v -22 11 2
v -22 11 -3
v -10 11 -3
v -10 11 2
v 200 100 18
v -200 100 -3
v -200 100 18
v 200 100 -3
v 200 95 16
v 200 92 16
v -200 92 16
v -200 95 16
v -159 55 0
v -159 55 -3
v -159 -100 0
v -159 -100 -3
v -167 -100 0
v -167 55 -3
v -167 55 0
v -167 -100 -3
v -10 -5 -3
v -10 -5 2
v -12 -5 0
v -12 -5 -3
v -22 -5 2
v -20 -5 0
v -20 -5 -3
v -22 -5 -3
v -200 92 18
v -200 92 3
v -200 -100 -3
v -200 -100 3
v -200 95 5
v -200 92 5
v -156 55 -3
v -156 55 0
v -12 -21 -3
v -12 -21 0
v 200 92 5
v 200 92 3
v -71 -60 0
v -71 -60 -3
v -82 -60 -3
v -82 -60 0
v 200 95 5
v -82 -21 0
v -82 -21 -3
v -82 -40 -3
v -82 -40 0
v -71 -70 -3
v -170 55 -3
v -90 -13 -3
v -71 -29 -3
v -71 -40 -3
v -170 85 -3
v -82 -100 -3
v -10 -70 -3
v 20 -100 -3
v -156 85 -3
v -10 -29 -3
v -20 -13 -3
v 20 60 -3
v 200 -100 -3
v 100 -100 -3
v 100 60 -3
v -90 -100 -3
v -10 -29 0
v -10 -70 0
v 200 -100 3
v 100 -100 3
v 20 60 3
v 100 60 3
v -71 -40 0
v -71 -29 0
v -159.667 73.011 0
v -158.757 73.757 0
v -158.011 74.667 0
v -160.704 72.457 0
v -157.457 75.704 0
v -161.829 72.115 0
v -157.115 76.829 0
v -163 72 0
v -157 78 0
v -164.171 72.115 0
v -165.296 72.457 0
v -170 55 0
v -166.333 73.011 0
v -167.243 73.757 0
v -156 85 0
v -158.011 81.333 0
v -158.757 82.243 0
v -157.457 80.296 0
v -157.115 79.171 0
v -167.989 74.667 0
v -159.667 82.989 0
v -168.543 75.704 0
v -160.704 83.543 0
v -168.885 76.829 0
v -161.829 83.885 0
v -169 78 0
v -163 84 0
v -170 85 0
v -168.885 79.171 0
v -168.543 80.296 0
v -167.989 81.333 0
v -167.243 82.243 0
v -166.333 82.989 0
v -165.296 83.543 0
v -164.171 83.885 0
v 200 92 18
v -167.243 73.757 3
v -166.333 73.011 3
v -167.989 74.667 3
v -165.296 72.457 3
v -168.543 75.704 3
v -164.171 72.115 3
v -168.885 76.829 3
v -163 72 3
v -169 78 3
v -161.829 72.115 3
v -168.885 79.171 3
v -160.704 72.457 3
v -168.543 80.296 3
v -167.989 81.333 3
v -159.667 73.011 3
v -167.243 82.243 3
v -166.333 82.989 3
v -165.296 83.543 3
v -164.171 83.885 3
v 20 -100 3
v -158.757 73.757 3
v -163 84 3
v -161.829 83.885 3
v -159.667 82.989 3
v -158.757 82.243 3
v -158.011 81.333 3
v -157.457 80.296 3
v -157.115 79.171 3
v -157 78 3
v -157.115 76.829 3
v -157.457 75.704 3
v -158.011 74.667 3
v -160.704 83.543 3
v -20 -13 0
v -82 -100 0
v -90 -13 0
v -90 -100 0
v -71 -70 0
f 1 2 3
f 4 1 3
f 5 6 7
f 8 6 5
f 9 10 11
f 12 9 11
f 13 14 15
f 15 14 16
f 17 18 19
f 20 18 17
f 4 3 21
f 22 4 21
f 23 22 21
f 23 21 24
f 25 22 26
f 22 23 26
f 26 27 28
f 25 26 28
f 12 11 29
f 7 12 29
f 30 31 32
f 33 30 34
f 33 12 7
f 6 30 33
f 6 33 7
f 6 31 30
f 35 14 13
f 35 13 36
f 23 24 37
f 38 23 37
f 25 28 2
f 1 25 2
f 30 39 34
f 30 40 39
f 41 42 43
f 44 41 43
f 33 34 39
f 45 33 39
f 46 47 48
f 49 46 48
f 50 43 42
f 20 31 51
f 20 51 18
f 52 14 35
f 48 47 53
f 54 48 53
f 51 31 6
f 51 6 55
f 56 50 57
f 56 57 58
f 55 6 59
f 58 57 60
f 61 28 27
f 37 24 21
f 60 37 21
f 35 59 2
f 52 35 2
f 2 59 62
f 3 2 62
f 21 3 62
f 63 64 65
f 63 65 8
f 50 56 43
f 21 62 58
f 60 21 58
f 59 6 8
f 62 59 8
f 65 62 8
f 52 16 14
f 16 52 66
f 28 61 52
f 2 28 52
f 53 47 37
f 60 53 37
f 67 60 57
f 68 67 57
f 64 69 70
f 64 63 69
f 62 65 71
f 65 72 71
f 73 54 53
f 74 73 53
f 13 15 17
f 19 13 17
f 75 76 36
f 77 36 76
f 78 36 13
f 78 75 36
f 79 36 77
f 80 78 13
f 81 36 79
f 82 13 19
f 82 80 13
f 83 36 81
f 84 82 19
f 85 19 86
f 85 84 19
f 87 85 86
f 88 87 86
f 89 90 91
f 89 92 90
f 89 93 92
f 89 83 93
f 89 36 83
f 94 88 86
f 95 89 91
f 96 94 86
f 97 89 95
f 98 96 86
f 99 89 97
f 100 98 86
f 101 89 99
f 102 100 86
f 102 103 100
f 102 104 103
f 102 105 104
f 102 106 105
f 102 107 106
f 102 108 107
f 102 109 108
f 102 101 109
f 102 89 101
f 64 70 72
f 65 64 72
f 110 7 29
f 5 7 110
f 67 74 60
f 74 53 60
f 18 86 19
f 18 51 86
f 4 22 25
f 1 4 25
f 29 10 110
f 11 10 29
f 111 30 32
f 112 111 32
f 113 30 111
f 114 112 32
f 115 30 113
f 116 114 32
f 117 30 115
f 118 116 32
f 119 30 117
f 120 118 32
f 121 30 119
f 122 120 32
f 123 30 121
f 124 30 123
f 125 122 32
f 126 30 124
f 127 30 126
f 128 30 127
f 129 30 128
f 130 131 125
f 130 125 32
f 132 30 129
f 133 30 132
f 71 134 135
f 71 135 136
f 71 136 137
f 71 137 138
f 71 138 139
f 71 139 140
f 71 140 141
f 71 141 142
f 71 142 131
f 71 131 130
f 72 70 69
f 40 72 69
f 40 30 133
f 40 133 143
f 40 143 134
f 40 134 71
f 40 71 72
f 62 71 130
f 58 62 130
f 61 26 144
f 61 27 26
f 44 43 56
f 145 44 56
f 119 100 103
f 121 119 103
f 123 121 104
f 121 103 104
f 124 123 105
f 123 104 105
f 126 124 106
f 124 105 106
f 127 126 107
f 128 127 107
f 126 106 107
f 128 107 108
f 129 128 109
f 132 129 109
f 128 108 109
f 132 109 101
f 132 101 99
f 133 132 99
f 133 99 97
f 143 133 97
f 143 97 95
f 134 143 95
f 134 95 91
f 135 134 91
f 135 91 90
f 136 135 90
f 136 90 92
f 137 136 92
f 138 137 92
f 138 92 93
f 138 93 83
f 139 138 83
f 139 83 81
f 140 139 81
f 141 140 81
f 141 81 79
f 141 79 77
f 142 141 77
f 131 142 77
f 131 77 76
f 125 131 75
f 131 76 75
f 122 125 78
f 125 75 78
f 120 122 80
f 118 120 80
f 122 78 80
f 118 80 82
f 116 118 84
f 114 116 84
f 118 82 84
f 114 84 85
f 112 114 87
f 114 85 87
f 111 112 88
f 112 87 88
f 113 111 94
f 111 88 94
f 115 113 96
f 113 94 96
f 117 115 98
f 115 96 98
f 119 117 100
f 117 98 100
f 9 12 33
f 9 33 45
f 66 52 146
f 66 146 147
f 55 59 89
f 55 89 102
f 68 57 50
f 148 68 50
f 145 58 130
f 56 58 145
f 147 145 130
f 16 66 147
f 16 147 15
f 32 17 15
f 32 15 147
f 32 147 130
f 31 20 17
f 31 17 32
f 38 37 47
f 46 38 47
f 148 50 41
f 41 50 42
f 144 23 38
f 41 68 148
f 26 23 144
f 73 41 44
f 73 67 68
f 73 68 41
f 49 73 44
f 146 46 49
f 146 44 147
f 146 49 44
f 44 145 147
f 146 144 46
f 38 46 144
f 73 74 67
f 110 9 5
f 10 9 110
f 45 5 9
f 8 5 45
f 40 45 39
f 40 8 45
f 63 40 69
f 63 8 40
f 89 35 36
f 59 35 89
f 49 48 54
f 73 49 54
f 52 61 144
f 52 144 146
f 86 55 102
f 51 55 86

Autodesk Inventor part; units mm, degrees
ref_plane "YZ Plane" through (0, 0, 0) normal (1, 0, 0) x (0, 1, 0)
ref_plane "XZ Plane" through (0, 0, 0) normal (0, 1, 0) x (-1, 0, 0)
ref_plane "XY Plane" through (0, 0, 0) normal (0, 0, 1) x (1, 0, 0)
sketch "Szkic1" plane through (0, 0, 0) normal (0, 0, 1) x (1, 0, 0)
  line L0 (200, -100) -> (-200, -100)
  line L1 (-200, -100) -> (-200, 100)
  line L2 (-200, 100) -> (200, 100)
  line L3 (200, 100) -> (200, -100)
  line L4 (200, -100) -> (-200, 100) construction
  line L5 (-200, -100) -> (200, 100) construction
  point P0 (0, 0)
  dimension "d0" = 400
  dimension "d1" = 200
extrude "Wyciągnięcie proste1" add sketch "Szkic1" along normal mid plane 6
sketch "Szkic2" plane through (0, 0, 3) normal (0, 0, 1) x (1, 0, 0)
  line L0 (-200, -100) -> (200, -100) projected
  line L1 (20, -100) -> (100, -100)
  line L2 (100, -100) -> (100, 60)
  line L3 (100, 60) -> (20, 60)
  line L4 (20, 60) -> (20, -100)
  line L5 (200, -100) -> (200, 100) projected
  line L6 (-22, 11) -> (-10, 11)
  line L7 (-10, 11) -> (-10, -5)
  line L8 (-10, -5) -> (-22, -5)
  line L9 (-22, -5) -> (-22, 11)
  line L10 (-71, -29) -> (-10, -29)
  line L11 (-10, -29) -> (-10, -70)
  line L12 (-10, -70) -> (-71, -70)
  line L13 (-71, -70) -> (-71, -29)
  point P0 (0, 0)
  point P1 (-10, 3)
  dimension "d4" = 80
  dimension "d5" = 160
  dimension "d6" = 100
  dimension "d7" = 16
  dimension "d8" = 12
  dimension "d9" = 95
  dimension "d10" = 61
  dimension "d11" = 41
  dimension "d12" = 30
  dimension "d13" = 30
  dimension "d14" = 30
extrude "Wyciągnięcie proste2" cut sketch "Szkic2" against normal through all contours L4 L3 L2 L0
sketch "Szkic3" plane through (0, 0, -3) normal (0, 0, -1) x (-1, 0, 0)
  line L0 (71, -29) -> (10, -29) projected
  line L1 (71, -70) -> (71, -29) projected
  line L2 (10, -70) -> (71, -70) projected
  line L3 (10, -29) -> (10, -70) projected
  line L4 (10, -5) -> (22, -5) projected
  line L5 (22, -5) -> (22, 11) projected
  line L6 (22, 11) -> (10, 11) projected
  line L7 (10, 11) -> (10, -5) projected
  point P0 (0, 0)
  point P1 (10, 3)
extrude "Wyciągnięcie proste3" cut sketch "Szkic3" against normal blind 5 contours L7 L6 L5 L4
sketch "Szkic4" plane through (0, 0, -3) normal (0, 0, -1) x (-1, 0, 0)
  line L0 (71, -29) -> (10, -29) projected
  line L1 (71, -70) -> (71, -29) projected
  line L2 (10, -70) -> (71, -70) projected
  line L3 (10, -29) -> (10, -70) projected
  point P0 (0, 0)
extrude "Wyciągnięcie proste4" cut sketch "Szkic4" against normal blind 3
sketch "Szkic6" plane through (0, 0, -3) normal (0, 0, -1) x (-1, 0, 0)
  line L0 (22, -5) -> (10, -5) projected
  line L1 (12, -5) -> (12, -21)
  line L2 (12, -21) -> (82, -21)
  line L3 (82, -21) -> (82, -40)
  line L4 (82, -40) -> (71, -40)
  line L5 (71, -29) -> (71, -70) projected
  line L6 (71, -60) -> (82, -60)
  line L7 (71, -70) -> (10, -70) projected
  line L8 (10, -70) -> (10, -29) projected
  line L9 (10, -29) -> (71, -29) projected
  line L10 (71, -29) -> (71, -70) projected
  line L11 (10, 11) -> (22, 11) projected
  line L12 (22, 11) -> (22, -5) projected
  line L13 (22, -5) -> (10, -5) projected
  line L14 (10, -5) -> (10, 11) projected
  line L15 (-20, 60) -> (-20, -100) projected
  line L16 (-20, -100) -> (200, -100) projected
  line L17 (200, -100) -> (200, 100) projected
  line L18 (200, 100) -> (-200, 100) projected
  line L19 (-200, 100) -> (-200, -100) projected
  line L20 (-200, -100) -> (-100, -100) projected
  line L21 (-100, -100) -> (-100, 60) projected
  line L22 (-100, 60) -> (-20, 60) projected
  line L23 (82, -60) -> (82, -100)
  line L24 (-20, -100) -> (200, -100) projected
  line L25 (20, -5) -> (20, -13)
  line L26 (20, -13) -> (90, -13)
  line L27 (90, -13) -> (90, -100)
  point P0 (0, 0)
  point P1 (12, -13)
  dimension "d21" = 8
  dimension "d22" = 32
  dimension "d23" = 8
  dimension "d24" = 8
  dimension "d25" = 20
  dimension "d26" = 40
  dimension "d27" = 8
  dimension "d28" = 8
extrude "Wyciągnięcie proste5" cut sketch "Szkic6" against normal blind 3 contours L25 L26 L27 L16 L23 L6 L5 L4 L3 L2 L1 L0
sketch "Szkic7" plane through (0, 0, 3) normal (0, 0, 1) x (1, 0, 0)
  line L0 (-200, 100) -> (200, 100) projected
  line L1 (200, 100) -> (200, -100) projected
  line L2 (-200, 100) -> (200, 100)
  line L3 (200, 100) -> (200, 92)
  line L4 (200, 92) -> (-200, 92)
  line L5 (-200, 92) -> (-200, 100)
  point P0 (0, 0)
  dimension "d31" = 8
extrude "Wyciągnięcie proste6" add sketch "Szkic7" along normal blind 15
sketch "Szkic8" plane through (-200, 92, 3) normal (0, -1, 0) x (1, 0, 0)
  line L0 (400, 15) -> (400, -6) projected
  line L1 (0, -6) -> (0, 15) projected
  line L2 (400, 13) -> (0, 13)
  line L3 (0, 13) -> (0, 2)
  line L4 (0, 2) -> (400, 2)
  line L5 (400, 2) -> (400, 13)
  line L6 (0, 15) -> (400, 15) projected
  point P0 (200, -3)
  point P1 (0, 13)
  dimension "d34" = 11
  dimension "d35" = 2
extrude "Wyciągnięcie proste7" cut sketch "Szkic8" against normal blind 3 contours L0 L4 L1 L2
sketch "Szkic9" plane through (0, 0, -3) normal (0, 0, -1) x (-1, 0, 0)
  line L0 (156, 85) -> (170, 85)
  line L1 (170, 85) -> (170, 55)
  line L2 (170, 55) -> (156, 55)
  line L3 (156, 55) -> (156, 85)
  line L4 (200, -100) -> (200, 100) projected
  line L5 (200, 100) -> (-200, 100) projected
  circle A0 centre (163, 78) radius 6
  line L6 (90, -100) -> (200, -100) projected
  line L7 (159, 55) -> (159, -100)
  line L8 (167, 55) -> (167, -100)
  point P0 (0, 0)
  point P1 (163, 55)
  dimension "d38" = 14
  dimension "d39" = 30
  dimension "d40" = 30
  dimension "d41" = 15
  dimension "d42" = 12
  dimension "d43" = 23
  dimension "d44" = 7
  dimension "d49" = 8
  dimension "d50" = 33
extrude "Wyciągnięcie proste8" cut sketch "Szkic9" against normal blind 6 contours A0
extrude "Wyciągnięcie proste9" cut sketch "Szkic9" against normal blind 3 contours L0 L1 L2 L3
extrude "Wyciągnięcie proste10" cut sketch "Szkic9" against normal blind 3 contours L2 L8 L6 L7
properties part number "FrontWall"
